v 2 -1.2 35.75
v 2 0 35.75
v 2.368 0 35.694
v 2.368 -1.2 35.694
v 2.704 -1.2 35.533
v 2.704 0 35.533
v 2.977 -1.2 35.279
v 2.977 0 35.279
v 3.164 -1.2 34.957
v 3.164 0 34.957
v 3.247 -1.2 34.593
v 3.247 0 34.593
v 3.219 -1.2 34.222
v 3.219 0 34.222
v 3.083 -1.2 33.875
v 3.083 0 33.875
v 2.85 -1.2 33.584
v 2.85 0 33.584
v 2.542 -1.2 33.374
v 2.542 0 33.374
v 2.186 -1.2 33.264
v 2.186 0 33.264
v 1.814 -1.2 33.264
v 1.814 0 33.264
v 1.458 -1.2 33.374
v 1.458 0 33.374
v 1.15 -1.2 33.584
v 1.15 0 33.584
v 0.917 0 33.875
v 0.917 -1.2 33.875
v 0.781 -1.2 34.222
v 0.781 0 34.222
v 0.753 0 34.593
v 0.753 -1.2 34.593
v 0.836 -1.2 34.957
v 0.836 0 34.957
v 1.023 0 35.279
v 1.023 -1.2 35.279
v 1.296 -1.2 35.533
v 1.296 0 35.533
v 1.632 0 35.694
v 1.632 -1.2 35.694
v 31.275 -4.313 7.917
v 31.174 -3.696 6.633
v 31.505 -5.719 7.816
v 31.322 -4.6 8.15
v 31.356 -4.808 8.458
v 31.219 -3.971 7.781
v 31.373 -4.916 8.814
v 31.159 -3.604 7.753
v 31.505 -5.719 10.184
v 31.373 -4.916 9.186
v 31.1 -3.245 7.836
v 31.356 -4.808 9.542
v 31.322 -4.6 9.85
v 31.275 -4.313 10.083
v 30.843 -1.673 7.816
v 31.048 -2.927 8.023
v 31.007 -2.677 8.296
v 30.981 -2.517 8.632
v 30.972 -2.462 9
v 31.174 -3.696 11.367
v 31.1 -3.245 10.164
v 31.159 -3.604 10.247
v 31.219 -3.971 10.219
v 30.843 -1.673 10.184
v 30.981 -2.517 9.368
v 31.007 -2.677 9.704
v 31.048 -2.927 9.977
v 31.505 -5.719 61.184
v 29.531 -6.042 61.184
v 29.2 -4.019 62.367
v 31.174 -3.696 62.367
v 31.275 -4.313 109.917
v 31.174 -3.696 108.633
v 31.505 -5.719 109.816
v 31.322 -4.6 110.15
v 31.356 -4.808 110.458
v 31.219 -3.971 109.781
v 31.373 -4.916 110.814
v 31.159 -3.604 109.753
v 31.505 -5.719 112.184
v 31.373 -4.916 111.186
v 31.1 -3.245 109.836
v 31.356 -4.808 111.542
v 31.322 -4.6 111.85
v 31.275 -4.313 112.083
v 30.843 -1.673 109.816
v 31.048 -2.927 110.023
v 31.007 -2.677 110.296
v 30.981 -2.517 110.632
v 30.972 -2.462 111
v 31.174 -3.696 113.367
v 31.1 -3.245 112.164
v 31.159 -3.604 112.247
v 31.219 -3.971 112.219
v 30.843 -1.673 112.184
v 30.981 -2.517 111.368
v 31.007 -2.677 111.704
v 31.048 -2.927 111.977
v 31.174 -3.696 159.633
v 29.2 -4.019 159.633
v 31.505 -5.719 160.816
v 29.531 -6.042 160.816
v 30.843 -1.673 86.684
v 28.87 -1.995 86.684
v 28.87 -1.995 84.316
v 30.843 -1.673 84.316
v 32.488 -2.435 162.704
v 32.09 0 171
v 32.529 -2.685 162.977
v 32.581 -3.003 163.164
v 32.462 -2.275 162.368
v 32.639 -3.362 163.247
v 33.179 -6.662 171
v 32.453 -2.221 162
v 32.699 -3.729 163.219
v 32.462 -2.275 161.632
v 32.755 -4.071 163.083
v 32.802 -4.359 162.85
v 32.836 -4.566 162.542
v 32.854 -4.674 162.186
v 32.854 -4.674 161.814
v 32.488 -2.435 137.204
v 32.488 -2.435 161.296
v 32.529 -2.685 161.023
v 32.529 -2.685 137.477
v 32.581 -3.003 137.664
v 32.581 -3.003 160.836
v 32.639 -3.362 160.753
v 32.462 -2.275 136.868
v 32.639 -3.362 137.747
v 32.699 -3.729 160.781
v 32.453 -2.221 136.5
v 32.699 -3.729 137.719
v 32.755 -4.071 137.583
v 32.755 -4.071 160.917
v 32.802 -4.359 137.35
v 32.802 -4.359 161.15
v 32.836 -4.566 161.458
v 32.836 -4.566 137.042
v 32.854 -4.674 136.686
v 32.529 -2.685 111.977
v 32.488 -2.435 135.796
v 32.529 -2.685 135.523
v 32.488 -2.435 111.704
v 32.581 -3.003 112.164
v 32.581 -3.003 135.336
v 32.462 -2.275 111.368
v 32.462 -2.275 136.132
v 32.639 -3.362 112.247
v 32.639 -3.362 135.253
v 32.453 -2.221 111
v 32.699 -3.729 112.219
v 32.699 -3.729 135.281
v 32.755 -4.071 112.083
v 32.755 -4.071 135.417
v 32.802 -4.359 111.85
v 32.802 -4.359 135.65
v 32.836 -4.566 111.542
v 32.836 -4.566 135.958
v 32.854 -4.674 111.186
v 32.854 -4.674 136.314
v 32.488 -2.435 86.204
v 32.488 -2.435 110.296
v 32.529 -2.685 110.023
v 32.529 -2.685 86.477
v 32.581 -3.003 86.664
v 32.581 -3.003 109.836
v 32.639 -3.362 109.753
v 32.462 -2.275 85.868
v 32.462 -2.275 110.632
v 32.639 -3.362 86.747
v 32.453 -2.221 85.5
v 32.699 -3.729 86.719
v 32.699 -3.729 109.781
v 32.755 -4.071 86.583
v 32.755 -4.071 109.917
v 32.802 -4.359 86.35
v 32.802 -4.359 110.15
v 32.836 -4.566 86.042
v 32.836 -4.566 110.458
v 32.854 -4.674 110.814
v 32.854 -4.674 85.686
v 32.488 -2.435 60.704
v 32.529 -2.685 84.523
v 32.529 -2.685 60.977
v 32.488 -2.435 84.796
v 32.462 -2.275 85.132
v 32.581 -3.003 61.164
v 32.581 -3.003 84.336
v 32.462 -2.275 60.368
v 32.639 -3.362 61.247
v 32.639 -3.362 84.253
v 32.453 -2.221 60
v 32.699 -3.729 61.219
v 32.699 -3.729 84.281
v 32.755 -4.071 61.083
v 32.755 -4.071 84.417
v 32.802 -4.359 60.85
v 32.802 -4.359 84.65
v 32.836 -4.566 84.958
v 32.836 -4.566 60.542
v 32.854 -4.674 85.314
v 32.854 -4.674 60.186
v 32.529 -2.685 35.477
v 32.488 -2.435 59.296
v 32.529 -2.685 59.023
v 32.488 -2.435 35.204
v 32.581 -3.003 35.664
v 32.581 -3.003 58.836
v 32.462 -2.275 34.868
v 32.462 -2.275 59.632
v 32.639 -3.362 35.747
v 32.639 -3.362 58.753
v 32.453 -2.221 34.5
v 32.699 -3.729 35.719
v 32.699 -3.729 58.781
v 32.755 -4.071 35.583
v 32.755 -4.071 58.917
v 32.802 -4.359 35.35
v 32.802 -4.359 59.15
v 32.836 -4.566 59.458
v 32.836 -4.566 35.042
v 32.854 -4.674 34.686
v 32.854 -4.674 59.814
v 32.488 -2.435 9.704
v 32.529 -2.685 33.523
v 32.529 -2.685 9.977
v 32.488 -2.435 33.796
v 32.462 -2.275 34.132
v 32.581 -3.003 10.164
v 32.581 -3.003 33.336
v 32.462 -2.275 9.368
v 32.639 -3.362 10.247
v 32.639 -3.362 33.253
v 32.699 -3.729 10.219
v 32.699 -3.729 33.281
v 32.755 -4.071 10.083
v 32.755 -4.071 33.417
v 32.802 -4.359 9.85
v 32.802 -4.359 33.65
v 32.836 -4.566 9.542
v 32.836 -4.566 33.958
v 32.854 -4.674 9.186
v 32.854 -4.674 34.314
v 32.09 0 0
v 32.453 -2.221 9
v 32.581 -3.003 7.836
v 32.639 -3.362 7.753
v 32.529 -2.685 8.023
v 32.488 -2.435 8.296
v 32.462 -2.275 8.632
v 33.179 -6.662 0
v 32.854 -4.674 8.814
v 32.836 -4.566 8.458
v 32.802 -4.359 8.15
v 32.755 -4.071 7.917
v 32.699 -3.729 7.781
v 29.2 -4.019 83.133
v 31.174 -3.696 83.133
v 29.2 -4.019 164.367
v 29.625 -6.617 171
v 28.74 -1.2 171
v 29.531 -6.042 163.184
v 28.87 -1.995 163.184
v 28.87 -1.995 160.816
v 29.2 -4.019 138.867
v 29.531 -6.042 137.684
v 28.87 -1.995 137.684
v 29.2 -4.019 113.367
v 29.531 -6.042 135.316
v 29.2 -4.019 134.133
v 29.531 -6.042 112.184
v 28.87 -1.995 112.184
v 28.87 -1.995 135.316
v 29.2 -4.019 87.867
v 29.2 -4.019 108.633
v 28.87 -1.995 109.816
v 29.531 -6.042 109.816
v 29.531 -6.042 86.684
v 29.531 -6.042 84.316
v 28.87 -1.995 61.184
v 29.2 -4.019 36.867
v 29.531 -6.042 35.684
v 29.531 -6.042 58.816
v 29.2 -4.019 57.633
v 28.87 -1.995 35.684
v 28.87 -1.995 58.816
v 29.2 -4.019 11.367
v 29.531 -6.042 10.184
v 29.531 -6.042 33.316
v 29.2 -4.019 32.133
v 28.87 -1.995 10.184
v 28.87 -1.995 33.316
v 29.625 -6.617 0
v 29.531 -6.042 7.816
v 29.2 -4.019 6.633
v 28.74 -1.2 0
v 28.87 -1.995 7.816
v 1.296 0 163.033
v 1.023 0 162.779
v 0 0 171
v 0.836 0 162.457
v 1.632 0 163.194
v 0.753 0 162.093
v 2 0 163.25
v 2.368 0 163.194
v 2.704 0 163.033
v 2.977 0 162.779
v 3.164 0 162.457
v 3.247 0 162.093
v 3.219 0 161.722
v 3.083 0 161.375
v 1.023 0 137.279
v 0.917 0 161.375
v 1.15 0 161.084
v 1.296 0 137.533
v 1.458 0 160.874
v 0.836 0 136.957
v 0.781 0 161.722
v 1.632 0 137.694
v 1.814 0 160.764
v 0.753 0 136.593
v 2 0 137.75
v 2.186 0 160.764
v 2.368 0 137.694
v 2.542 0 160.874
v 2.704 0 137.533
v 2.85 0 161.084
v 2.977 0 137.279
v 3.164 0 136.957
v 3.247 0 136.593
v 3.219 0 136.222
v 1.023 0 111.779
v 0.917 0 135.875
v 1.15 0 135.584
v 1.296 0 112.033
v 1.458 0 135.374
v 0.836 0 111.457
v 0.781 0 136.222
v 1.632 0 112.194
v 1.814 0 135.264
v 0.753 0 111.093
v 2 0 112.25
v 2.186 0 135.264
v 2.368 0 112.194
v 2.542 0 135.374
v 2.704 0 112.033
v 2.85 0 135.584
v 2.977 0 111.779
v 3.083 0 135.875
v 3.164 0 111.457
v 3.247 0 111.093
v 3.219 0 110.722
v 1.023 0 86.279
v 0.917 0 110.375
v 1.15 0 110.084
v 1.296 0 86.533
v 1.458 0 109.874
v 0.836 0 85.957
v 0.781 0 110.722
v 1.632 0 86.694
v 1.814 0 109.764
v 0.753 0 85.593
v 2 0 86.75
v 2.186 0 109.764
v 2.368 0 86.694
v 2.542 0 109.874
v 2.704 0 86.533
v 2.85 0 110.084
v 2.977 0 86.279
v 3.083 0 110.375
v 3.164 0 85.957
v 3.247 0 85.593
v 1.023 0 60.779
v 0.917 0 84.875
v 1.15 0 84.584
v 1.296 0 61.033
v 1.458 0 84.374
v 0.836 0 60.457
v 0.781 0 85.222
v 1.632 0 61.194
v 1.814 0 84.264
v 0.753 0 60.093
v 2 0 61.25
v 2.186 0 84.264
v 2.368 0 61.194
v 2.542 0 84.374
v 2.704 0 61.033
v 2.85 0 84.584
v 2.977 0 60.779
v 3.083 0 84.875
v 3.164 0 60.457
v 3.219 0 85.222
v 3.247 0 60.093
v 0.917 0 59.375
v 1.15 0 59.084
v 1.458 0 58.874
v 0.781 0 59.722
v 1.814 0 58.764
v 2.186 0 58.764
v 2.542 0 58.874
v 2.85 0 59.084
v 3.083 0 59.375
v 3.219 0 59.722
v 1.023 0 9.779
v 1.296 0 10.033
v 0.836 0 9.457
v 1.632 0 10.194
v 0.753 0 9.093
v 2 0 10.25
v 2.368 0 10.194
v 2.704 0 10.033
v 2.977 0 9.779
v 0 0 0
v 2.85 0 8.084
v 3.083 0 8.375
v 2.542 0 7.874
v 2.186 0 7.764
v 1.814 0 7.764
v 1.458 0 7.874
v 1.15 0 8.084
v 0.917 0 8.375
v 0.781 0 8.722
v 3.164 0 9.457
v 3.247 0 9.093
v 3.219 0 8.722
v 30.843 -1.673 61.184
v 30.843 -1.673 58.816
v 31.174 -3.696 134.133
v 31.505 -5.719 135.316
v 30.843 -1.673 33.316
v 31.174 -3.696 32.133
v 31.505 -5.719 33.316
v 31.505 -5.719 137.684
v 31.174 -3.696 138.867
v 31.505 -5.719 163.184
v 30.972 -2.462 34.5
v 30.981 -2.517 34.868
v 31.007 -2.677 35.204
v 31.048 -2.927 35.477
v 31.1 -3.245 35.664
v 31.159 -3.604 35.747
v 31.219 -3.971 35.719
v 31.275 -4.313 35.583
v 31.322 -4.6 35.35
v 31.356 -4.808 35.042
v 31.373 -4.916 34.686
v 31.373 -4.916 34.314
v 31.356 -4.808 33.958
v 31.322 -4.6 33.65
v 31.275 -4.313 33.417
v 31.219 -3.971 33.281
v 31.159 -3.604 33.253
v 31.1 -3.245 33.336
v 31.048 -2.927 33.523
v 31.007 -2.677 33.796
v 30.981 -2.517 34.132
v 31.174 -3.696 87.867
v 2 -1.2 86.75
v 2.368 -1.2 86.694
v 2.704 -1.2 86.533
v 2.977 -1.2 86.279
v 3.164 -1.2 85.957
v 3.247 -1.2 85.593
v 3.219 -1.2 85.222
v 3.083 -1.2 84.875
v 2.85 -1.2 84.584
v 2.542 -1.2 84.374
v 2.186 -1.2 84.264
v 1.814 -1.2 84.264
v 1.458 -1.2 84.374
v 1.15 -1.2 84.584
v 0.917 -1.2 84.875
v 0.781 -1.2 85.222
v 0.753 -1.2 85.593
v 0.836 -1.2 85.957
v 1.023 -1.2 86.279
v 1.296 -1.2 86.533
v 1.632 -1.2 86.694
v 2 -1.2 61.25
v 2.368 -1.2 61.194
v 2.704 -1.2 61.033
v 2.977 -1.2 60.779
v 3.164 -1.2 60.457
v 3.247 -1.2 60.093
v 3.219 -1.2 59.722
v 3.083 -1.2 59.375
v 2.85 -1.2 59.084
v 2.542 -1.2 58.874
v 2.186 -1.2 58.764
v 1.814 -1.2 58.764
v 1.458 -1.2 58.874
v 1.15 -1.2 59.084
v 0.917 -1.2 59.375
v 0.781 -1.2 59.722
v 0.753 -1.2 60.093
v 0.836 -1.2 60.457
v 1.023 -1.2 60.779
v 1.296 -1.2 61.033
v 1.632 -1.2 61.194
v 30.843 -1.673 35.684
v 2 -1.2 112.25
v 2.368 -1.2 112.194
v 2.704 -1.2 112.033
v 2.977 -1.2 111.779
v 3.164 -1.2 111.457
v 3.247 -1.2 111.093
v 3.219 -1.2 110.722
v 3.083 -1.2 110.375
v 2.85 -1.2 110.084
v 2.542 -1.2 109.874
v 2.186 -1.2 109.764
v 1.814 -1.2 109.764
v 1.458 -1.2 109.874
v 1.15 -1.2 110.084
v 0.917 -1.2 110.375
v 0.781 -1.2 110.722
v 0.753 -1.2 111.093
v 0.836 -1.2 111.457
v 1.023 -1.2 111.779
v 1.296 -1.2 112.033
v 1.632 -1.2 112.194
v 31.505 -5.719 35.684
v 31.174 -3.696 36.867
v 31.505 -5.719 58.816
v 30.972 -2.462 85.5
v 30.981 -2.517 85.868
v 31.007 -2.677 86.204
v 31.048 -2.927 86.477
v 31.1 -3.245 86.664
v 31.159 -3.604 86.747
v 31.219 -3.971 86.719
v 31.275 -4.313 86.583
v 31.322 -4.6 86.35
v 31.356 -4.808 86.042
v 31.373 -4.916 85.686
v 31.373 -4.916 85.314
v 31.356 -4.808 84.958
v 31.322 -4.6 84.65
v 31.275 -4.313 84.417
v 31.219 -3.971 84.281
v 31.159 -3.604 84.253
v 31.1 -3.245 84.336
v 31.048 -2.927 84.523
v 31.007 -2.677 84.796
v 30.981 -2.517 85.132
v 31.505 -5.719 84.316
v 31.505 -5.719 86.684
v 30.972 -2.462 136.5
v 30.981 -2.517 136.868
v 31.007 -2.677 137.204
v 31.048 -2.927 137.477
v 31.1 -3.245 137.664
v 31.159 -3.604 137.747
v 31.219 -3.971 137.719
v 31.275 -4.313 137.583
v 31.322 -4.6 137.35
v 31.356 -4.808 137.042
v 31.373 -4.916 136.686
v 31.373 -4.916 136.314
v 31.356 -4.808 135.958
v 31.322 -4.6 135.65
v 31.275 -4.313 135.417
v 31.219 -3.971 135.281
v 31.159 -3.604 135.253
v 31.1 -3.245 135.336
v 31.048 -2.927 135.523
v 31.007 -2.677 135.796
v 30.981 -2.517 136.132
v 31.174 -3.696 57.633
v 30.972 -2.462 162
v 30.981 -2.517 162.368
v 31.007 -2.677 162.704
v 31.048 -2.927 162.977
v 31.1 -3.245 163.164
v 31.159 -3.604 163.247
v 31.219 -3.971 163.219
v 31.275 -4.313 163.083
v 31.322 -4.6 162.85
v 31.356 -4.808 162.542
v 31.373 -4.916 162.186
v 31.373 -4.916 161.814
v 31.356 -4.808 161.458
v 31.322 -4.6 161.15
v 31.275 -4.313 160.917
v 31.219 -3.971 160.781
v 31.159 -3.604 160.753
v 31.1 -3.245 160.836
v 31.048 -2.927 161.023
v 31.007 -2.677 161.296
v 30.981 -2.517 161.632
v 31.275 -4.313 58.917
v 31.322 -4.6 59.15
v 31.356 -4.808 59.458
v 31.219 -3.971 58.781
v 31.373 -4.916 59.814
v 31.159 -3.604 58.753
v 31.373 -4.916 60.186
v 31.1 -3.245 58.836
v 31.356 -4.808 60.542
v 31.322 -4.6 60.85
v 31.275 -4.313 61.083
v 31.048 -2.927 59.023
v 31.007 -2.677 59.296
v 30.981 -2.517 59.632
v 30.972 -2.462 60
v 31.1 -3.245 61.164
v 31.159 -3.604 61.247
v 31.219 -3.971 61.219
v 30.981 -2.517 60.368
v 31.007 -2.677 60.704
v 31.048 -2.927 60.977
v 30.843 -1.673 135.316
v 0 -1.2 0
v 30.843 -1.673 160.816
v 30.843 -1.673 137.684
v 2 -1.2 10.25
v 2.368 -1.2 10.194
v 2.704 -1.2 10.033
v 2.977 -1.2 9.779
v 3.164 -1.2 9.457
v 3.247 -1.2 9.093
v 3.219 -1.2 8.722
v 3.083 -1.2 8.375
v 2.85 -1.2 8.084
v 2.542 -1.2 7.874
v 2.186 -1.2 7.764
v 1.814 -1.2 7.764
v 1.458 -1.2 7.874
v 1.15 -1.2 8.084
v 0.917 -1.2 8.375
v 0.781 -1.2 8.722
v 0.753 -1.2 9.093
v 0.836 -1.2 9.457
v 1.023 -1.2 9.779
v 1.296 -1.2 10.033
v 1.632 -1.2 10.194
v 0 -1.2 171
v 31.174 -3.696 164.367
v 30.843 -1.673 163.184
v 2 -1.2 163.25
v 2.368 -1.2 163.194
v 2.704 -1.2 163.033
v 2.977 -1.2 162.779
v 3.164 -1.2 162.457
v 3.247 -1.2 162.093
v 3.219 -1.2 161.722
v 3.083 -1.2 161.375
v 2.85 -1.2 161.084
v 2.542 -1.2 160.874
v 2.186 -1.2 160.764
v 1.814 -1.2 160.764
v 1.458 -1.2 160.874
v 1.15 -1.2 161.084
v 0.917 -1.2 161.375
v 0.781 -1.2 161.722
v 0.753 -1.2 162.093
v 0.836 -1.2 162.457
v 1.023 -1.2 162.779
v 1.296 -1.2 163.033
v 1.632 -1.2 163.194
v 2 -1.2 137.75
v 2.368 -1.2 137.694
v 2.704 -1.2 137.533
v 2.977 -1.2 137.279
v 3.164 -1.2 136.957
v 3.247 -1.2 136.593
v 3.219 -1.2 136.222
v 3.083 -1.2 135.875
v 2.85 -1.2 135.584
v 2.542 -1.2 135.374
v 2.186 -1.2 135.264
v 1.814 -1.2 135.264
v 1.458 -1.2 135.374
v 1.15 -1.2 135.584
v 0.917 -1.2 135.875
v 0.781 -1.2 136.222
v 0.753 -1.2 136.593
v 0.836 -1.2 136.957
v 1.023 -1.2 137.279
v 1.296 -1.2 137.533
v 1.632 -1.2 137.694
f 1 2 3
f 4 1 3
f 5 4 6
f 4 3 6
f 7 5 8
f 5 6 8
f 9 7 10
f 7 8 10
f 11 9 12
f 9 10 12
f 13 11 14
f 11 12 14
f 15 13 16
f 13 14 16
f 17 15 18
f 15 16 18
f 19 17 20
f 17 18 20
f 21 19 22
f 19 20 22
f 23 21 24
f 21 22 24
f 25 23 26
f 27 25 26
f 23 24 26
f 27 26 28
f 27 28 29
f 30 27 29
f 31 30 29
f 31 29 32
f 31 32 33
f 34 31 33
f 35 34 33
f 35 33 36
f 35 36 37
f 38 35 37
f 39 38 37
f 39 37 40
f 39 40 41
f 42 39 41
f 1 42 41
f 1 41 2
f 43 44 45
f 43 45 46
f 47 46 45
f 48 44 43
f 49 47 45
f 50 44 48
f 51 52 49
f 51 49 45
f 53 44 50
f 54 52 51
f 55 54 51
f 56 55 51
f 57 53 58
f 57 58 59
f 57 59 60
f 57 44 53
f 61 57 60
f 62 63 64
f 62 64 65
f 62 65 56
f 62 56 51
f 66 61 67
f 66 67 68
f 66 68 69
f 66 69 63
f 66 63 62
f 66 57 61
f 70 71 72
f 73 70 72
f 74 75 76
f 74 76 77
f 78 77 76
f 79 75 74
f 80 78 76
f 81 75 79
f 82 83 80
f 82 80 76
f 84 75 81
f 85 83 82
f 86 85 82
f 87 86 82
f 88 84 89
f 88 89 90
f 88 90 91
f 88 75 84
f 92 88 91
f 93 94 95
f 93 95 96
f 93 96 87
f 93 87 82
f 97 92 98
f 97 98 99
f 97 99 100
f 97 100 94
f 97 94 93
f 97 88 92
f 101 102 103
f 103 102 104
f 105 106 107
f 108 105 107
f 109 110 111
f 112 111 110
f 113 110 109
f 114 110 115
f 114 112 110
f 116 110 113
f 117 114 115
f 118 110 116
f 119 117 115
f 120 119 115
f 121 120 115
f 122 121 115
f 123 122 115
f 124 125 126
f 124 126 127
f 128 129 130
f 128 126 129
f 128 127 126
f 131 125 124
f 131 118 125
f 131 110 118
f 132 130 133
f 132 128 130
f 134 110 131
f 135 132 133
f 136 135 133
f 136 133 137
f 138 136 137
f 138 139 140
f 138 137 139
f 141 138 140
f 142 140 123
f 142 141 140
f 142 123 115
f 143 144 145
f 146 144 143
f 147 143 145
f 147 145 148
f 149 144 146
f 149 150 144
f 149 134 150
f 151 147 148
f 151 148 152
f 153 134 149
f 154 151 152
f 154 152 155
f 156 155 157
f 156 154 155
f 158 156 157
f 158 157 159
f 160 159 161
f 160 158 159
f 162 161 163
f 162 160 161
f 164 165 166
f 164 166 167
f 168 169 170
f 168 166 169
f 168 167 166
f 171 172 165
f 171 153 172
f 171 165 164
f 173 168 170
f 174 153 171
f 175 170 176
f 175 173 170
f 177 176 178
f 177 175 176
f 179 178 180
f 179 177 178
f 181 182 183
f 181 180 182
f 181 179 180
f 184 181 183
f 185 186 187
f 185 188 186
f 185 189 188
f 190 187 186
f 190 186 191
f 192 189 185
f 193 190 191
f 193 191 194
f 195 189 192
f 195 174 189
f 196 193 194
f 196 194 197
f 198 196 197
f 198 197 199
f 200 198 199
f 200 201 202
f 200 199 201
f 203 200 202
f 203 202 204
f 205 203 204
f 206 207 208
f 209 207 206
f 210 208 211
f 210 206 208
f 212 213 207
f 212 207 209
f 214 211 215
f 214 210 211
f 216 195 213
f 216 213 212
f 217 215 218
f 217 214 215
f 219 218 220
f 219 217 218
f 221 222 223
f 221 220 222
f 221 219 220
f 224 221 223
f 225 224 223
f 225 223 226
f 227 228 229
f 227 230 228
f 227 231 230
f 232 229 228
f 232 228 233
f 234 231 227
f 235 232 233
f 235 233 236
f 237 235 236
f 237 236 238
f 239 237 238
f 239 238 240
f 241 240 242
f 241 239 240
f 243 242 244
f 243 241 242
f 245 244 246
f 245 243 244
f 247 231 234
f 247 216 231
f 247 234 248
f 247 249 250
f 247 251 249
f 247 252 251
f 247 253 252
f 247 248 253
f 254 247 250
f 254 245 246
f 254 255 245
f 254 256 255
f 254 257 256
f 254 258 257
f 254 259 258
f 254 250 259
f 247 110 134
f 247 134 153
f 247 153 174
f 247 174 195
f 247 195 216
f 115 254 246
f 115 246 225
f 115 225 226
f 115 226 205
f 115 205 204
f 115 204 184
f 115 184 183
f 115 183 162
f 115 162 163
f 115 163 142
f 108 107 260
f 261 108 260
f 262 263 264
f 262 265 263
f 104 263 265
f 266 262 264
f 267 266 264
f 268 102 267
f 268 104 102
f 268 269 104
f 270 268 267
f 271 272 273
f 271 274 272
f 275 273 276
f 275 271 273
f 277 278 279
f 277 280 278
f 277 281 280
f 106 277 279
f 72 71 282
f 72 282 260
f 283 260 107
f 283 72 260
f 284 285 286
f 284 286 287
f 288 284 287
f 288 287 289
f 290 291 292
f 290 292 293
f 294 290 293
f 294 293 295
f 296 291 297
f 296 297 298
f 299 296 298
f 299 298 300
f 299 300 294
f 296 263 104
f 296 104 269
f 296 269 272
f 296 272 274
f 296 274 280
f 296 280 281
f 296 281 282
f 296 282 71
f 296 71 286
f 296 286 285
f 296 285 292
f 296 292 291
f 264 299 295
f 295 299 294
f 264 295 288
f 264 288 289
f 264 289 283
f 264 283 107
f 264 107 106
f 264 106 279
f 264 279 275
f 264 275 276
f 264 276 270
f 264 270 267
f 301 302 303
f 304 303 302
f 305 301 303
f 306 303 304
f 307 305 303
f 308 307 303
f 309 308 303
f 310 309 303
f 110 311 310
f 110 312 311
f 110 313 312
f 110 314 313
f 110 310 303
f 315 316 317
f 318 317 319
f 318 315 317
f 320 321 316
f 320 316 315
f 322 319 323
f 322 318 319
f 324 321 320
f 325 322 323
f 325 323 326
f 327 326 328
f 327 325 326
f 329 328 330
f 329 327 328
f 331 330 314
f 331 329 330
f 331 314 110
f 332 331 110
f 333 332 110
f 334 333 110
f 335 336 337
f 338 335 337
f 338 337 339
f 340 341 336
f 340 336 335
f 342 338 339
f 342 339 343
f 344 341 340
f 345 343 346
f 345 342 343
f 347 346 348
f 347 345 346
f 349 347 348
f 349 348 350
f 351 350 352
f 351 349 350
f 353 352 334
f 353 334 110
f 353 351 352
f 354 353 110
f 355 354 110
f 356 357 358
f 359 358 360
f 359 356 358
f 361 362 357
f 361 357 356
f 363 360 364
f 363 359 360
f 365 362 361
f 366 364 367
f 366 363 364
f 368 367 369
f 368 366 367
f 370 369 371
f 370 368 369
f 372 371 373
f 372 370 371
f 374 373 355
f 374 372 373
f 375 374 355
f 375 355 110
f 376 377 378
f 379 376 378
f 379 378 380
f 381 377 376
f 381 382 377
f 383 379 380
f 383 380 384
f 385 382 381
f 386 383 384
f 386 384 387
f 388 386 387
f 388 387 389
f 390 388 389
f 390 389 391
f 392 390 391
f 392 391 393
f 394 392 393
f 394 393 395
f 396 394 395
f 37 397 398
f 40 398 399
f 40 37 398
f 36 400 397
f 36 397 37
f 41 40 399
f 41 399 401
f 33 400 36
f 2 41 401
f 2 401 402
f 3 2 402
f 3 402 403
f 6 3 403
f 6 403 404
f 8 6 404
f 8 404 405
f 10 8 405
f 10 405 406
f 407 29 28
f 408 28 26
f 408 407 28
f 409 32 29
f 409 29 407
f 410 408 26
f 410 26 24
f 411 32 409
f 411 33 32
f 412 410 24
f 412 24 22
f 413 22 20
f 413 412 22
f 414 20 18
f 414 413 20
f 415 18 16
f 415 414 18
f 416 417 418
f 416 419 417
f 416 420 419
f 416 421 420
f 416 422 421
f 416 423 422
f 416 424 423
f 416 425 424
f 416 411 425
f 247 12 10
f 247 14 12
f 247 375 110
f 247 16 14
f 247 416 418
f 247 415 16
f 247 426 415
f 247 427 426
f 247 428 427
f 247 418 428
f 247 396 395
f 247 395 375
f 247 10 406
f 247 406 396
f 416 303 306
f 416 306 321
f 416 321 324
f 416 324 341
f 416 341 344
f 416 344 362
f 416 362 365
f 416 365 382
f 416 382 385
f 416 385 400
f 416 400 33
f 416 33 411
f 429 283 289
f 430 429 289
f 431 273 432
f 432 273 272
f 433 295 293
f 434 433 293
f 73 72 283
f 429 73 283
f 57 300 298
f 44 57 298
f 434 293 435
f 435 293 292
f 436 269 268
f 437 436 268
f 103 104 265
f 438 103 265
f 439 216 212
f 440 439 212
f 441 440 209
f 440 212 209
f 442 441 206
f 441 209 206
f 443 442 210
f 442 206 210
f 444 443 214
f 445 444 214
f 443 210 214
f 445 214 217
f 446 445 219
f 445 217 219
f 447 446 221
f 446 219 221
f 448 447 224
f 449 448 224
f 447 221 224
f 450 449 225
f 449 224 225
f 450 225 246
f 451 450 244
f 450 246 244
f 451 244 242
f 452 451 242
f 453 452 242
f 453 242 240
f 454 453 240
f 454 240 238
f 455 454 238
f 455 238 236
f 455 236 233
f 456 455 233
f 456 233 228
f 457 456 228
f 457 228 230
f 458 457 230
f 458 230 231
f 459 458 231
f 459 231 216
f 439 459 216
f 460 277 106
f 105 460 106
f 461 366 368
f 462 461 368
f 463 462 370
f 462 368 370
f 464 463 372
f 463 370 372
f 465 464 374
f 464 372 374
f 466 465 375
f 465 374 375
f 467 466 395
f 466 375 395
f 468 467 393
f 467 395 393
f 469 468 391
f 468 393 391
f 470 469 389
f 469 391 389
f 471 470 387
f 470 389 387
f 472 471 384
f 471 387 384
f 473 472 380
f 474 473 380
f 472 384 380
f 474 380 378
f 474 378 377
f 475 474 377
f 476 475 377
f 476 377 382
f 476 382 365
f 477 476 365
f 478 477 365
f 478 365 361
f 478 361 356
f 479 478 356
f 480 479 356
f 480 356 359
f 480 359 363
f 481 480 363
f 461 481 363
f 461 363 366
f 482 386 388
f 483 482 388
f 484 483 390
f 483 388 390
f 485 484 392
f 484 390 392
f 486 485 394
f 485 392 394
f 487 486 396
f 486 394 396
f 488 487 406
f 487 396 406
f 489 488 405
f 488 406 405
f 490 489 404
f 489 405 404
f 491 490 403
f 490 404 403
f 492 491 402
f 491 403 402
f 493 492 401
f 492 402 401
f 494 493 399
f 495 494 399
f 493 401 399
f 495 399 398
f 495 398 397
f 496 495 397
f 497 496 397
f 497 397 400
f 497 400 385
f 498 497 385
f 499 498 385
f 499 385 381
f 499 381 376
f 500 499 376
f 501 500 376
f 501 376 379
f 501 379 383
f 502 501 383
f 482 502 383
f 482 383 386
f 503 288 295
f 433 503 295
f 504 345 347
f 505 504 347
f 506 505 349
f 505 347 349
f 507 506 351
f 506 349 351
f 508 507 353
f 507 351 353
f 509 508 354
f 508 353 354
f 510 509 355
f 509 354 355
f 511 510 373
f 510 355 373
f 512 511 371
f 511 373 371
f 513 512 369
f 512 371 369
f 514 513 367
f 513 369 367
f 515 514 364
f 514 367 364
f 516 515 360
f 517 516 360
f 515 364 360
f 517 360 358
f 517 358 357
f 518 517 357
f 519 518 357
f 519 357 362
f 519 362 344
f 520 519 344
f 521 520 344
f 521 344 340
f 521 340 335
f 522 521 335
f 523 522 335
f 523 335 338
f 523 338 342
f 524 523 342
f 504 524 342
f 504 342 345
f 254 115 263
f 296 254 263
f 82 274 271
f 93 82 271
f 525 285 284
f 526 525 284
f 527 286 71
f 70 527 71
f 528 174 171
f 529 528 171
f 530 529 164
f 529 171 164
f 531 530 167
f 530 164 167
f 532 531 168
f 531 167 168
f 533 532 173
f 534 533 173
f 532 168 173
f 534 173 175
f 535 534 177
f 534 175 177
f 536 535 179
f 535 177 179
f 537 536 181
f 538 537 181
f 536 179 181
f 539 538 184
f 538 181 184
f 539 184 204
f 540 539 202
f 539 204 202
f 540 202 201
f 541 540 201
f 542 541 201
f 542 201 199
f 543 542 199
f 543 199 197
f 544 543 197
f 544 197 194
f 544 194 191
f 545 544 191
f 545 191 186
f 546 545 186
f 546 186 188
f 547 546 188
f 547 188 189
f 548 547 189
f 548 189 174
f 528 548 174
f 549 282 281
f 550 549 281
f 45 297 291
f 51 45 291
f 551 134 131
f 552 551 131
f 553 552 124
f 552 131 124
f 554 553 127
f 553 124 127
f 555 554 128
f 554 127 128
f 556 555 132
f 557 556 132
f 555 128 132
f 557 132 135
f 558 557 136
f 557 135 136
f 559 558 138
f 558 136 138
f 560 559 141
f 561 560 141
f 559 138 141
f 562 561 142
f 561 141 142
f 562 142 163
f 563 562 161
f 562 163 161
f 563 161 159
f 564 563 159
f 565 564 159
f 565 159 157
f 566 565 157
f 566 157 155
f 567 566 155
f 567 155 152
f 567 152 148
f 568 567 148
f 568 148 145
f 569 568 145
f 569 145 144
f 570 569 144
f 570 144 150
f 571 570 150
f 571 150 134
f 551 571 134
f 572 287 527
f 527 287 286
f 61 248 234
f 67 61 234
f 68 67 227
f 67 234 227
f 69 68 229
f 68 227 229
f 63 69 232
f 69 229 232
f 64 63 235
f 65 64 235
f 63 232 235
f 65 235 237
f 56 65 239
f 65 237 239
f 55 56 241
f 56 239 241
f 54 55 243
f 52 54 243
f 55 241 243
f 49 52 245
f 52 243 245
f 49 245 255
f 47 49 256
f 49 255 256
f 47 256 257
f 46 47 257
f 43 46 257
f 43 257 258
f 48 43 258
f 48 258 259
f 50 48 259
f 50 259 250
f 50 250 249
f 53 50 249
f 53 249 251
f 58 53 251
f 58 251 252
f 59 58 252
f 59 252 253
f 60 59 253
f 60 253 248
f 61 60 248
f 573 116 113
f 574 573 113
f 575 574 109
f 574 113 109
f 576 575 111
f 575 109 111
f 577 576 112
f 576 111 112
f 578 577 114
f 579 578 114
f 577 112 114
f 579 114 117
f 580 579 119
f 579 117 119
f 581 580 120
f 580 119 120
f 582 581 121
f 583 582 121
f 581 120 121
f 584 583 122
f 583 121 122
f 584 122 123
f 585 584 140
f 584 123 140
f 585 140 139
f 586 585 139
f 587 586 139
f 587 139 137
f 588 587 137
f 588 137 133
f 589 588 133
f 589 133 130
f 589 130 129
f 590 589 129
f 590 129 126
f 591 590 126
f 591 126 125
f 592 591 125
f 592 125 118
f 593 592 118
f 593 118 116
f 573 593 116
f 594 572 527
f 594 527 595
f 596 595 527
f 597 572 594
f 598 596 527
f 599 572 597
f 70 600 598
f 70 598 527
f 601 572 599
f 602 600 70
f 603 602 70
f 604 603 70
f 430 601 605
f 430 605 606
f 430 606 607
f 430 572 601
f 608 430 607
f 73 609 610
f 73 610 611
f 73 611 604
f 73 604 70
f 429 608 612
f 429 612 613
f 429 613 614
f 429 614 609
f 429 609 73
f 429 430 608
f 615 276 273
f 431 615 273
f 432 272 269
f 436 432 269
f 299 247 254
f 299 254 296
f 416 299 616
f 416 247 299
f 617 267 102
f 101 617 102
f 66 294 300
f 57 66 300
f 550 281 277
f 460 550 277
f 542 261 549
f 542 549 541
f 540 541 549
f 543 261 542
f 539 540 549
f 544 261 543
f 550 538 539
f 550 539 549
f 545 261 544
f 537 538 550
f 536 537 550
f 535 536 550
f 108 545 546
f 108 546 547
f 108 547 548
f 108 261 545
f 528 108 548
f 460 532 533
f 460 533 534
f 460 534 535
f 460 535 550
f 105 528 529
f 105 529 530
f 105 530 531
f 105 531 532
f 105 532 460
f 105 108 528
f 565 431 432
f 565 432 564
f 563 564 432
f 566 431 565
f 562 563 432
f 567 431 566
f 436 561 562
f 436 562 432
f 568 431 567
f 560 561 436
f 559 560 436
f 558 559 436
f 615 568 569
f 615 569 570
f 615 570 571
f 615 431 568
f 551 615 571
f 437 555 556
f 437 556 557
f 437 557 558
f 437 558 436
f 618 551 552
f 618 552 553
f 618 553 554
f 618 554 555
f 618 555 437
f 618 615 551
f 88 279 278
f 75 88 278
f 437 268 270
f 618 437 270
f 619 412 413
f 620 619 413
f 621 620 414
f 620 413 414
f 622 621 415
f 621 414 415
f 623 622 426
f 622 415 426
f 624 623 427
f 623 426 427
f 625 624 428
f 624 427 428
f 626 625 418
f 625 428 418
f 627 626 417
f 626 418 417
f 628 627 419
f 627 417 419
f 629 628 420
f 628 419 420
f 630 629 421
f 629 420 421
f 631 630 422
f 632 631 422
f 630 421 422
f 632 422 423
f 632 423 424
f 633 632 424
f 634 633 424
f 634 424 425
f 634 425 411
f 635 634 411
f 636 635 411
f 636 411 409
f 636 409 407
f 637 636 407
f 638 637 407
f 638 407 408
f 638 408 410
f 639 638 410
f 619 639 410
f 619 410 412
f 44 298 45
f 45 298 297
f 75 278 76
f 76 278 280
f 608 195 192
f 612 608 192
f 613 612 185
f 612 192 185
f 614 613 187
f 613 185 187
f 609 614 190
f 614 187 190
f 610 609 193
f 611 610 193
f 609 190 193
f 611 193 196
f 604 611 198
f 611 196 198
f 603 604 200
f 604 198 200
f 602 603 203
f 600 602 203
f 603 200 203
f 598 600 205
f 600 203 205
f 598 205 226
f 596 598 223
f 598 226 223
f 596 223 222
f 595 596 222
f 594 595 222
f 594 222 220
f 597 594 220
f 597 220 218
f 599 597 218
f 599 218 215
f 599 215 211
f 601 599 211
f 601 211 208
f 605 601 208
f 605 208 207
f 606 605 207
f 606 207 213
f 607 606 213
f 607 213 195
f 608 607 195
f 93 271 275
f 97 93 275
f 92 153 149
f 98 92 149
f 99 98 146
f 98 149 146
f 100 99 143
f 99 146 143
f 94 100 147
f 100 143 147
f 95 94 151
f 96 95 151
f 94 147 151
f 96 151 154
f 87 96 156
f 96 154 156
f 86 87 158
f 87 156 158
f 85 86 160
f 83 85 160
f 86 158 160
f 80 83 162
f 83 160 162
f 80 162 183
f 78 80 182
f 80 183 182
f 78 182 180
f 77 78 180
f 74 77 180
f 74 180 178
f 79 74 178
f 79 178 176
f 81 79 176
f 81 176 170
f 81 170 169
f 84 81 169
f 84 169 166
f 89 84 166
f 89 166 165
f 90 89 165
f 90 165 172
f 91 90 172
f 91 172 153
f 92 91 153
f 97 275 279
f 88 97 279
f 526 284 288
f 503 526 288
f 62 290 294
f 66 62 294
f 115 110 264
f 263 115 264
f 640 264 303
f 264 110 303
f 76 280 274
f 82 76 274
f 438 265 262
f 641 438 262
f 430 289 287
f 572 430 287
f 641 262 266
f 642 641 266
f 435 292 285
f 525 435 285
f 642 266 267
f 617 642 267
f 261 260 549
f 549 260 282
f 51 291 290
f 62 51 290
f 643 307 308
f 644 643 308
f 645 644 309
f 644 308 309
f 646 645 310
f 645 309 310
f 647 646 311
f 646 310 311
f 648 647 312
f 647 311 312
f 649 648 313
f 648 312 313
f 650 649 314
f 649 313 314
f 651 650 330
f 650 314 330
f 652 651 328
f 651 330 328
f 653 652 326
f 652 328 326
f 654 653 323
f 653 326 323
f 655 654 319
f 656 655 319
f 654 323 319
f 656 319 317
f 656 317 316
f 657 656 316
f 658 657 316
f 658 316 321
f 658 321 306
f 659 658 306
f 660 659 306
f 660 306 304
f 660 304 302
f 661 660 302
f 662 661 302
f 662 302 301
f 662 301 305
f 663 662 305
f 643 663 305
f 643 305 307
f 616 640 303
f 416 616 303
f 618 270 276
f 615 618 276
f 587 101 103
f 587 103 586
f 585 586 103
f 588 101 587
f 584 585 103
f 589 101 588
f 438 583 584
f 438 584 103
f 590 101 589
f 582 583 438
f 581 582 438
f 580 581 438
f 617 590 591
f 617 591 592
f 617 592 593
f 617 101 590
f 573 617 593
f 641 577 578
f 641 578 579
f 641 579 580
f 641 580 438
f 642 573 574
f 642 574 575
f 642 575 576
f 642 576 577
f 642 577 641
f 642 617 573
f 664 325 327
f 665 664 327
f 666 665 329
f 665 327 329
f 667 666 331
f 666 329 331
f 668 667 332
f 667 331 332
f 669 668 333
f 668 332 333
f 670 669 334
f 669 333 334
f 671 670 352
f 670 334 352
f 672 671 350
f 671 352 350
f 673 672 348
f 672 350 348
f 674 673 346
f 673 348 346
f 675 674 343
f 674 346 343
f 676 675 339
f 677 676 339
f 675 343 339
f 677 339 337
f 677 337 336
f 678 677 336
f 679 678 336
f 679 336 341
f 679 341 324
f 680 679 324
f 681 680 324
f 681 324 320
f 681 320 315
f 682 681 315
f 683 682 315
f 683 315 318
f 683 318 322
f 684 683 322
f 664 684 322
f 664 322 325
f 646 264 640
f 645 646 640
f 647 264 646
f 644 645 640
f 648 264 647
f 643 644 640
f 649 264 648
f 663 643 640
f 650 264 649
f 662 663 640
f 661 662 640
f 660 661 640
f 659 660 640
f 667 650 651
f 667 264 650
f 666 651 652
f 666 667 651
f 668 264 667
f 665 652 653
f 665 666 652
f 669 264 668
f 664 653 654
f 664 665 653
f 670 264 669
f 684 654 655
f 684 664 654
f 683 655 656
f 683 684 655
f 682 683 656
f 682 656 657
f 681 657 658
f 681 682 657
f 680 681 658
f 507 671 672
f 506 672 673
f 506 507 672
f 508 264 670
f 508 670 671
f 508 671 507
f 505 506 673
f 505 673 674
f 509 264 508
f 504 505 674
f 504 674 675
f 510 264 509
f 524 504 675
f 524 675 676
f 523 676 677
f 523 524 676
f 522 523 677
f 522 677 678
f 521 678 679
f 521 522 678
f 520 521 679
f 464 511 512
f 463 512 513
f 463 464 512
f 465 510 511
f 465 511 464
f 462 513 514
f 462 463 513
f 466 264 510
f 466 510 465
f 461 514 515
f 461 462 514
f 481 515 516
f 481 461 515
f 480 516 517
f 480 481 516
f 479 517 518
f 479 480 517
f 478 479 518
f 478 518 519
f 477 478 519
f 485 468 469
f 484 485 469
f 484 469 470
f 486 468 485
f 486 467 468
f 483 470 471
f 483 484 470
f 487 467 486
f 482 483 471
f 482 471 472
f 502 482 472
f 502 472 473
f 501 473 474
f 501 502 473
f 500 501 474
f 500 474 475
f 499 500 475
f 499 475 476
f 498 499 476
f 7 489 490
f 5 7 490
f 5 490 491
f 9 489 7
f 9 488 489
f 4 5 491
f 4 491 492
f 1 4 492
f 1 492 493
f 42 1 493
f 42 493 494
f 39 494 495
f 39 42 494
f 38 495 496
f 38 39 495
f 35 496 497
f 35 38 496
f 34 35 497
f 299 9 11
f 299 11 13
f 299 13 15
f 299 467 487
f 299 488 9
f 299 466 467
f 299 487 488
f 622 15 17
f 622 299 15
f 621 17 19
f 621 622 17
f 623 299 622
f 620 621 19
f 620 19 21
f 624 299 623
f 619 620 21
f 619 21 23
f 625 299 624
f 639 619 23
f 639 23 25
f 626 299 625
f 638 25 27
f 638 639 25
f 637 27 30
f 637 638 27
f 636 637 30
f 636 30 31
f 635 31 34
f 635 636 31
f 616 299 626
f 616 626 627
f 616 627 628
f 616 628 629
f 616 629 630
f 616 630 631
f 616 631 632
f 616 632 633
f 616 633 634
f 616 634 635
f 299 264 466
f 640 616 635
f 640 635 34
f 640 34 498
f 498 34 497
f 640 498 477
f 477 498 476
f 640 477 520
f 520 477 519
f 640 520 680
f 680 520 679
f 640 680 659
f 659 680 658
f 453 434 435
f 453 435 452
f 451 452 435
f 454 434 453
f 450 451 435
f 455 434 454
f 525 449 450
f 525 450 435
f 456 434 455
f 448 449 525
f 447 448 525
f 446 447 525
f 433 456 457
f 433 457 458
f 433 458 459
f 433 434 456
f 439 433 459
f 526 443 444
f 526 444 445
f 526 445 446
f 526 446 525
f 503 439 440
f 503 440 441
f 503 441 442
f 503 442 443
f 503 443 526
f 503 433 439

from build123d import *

# Parameters (mm, degrees)
BOSS_EXTRUDE1_DEPTH = 171
SKETCH2_R           = 1.25
CUT_EXTRUDE1_DEPTH  = 50
SKETCH3_R           = 1.25
CUT_EXTRUDE2_DEPTH  = 50
CUT_EXTRUDE3_DEPTH  = 2
LPATTERN1_COUNT     = 7
LPATTERN1_PITCH     = 25.5


with BuildPart() as part:
    # Sketch1 → Boss-Extrude1 (new body)
    with BuildSketch(Plane.XY):
        Polygon((0, 0), (32.09, 0), (33.178500502, -6.66165645), (29.624787969, -6.61699683), (28.739662203, -1.2), (0, -1.2), align=None)
    extrude(amount=BOSS_EXTRUDE1_DEPTH)

    # Sketch2 → Cut-Extrude1 (cut)
    with BuildSketch(Plane(origin=(0, 0, 0), x_dir=(1, 0, 0), z_dir=(0, 1, 0))):
        with Locations(Location((2, -9, 0), (0, 0, 270))):
            Circle(SKETCH2_R)
    cut_extrude1 = extrude(amount=-CUT_EXTRUDE1_DEPTH, mode=Mode.SUBTRACT)

    # Sketch3 → Cut-Extrude2 (cut)
    with BuildSketch(Plane(origin=(31.255513263, 5.107084422, 0), x_dir=(0, 0, -1), z_dir=(0.9869120666582158, 0.16125933363501674, 0))):
        with Locations(Location((-9, -8.674812016, 0), (0, 0, 90))):
            Circle(SKETCH3_R)
    cut_extrude2 = extrude(amount=-CUT_EXTRUDE2_DEPTH, mode=Mode.SUBTRACT)

    # Sketch4 → Cut-Extrude3 (cut)
    with BuildSketch(Plane(origin=(27.801321029, 4.542676754, 0), x_dir=(0, 0, 1), z_dir=(-0.9869120666582157, -0.1612593336350174, 0))):
        Polygon((7.816431948, -6.624812016), (6.632863896, -8.674812016), (7.816431948, -10.724812016), (10.183568052, -10.724812016), (11.367136104, -8.674812016), (10.183568052, -6.624812016), align=None)
    cut_extrude3 = extrude(amount=-CUT_EXTRUDE3_DEPTH, mode=Mode.SUBTRACT)

    # LPattern1: Cut-Extrude1, Cut-Extrude2, Cut-Extrude3 ×7
    with Locations(*[(0, 0, i * LPATTERN1_PITCH) for i in range(1, LPATTERN1_COUNT)]):
        add(cut_extrude1, mode=Mode.SUBTRACT)
        add(cut_extrude2, mode=Mode.SUBTRACT)
        add(cut_extrude3, mode=Mode.SUBTRACT)


solid = part.part
